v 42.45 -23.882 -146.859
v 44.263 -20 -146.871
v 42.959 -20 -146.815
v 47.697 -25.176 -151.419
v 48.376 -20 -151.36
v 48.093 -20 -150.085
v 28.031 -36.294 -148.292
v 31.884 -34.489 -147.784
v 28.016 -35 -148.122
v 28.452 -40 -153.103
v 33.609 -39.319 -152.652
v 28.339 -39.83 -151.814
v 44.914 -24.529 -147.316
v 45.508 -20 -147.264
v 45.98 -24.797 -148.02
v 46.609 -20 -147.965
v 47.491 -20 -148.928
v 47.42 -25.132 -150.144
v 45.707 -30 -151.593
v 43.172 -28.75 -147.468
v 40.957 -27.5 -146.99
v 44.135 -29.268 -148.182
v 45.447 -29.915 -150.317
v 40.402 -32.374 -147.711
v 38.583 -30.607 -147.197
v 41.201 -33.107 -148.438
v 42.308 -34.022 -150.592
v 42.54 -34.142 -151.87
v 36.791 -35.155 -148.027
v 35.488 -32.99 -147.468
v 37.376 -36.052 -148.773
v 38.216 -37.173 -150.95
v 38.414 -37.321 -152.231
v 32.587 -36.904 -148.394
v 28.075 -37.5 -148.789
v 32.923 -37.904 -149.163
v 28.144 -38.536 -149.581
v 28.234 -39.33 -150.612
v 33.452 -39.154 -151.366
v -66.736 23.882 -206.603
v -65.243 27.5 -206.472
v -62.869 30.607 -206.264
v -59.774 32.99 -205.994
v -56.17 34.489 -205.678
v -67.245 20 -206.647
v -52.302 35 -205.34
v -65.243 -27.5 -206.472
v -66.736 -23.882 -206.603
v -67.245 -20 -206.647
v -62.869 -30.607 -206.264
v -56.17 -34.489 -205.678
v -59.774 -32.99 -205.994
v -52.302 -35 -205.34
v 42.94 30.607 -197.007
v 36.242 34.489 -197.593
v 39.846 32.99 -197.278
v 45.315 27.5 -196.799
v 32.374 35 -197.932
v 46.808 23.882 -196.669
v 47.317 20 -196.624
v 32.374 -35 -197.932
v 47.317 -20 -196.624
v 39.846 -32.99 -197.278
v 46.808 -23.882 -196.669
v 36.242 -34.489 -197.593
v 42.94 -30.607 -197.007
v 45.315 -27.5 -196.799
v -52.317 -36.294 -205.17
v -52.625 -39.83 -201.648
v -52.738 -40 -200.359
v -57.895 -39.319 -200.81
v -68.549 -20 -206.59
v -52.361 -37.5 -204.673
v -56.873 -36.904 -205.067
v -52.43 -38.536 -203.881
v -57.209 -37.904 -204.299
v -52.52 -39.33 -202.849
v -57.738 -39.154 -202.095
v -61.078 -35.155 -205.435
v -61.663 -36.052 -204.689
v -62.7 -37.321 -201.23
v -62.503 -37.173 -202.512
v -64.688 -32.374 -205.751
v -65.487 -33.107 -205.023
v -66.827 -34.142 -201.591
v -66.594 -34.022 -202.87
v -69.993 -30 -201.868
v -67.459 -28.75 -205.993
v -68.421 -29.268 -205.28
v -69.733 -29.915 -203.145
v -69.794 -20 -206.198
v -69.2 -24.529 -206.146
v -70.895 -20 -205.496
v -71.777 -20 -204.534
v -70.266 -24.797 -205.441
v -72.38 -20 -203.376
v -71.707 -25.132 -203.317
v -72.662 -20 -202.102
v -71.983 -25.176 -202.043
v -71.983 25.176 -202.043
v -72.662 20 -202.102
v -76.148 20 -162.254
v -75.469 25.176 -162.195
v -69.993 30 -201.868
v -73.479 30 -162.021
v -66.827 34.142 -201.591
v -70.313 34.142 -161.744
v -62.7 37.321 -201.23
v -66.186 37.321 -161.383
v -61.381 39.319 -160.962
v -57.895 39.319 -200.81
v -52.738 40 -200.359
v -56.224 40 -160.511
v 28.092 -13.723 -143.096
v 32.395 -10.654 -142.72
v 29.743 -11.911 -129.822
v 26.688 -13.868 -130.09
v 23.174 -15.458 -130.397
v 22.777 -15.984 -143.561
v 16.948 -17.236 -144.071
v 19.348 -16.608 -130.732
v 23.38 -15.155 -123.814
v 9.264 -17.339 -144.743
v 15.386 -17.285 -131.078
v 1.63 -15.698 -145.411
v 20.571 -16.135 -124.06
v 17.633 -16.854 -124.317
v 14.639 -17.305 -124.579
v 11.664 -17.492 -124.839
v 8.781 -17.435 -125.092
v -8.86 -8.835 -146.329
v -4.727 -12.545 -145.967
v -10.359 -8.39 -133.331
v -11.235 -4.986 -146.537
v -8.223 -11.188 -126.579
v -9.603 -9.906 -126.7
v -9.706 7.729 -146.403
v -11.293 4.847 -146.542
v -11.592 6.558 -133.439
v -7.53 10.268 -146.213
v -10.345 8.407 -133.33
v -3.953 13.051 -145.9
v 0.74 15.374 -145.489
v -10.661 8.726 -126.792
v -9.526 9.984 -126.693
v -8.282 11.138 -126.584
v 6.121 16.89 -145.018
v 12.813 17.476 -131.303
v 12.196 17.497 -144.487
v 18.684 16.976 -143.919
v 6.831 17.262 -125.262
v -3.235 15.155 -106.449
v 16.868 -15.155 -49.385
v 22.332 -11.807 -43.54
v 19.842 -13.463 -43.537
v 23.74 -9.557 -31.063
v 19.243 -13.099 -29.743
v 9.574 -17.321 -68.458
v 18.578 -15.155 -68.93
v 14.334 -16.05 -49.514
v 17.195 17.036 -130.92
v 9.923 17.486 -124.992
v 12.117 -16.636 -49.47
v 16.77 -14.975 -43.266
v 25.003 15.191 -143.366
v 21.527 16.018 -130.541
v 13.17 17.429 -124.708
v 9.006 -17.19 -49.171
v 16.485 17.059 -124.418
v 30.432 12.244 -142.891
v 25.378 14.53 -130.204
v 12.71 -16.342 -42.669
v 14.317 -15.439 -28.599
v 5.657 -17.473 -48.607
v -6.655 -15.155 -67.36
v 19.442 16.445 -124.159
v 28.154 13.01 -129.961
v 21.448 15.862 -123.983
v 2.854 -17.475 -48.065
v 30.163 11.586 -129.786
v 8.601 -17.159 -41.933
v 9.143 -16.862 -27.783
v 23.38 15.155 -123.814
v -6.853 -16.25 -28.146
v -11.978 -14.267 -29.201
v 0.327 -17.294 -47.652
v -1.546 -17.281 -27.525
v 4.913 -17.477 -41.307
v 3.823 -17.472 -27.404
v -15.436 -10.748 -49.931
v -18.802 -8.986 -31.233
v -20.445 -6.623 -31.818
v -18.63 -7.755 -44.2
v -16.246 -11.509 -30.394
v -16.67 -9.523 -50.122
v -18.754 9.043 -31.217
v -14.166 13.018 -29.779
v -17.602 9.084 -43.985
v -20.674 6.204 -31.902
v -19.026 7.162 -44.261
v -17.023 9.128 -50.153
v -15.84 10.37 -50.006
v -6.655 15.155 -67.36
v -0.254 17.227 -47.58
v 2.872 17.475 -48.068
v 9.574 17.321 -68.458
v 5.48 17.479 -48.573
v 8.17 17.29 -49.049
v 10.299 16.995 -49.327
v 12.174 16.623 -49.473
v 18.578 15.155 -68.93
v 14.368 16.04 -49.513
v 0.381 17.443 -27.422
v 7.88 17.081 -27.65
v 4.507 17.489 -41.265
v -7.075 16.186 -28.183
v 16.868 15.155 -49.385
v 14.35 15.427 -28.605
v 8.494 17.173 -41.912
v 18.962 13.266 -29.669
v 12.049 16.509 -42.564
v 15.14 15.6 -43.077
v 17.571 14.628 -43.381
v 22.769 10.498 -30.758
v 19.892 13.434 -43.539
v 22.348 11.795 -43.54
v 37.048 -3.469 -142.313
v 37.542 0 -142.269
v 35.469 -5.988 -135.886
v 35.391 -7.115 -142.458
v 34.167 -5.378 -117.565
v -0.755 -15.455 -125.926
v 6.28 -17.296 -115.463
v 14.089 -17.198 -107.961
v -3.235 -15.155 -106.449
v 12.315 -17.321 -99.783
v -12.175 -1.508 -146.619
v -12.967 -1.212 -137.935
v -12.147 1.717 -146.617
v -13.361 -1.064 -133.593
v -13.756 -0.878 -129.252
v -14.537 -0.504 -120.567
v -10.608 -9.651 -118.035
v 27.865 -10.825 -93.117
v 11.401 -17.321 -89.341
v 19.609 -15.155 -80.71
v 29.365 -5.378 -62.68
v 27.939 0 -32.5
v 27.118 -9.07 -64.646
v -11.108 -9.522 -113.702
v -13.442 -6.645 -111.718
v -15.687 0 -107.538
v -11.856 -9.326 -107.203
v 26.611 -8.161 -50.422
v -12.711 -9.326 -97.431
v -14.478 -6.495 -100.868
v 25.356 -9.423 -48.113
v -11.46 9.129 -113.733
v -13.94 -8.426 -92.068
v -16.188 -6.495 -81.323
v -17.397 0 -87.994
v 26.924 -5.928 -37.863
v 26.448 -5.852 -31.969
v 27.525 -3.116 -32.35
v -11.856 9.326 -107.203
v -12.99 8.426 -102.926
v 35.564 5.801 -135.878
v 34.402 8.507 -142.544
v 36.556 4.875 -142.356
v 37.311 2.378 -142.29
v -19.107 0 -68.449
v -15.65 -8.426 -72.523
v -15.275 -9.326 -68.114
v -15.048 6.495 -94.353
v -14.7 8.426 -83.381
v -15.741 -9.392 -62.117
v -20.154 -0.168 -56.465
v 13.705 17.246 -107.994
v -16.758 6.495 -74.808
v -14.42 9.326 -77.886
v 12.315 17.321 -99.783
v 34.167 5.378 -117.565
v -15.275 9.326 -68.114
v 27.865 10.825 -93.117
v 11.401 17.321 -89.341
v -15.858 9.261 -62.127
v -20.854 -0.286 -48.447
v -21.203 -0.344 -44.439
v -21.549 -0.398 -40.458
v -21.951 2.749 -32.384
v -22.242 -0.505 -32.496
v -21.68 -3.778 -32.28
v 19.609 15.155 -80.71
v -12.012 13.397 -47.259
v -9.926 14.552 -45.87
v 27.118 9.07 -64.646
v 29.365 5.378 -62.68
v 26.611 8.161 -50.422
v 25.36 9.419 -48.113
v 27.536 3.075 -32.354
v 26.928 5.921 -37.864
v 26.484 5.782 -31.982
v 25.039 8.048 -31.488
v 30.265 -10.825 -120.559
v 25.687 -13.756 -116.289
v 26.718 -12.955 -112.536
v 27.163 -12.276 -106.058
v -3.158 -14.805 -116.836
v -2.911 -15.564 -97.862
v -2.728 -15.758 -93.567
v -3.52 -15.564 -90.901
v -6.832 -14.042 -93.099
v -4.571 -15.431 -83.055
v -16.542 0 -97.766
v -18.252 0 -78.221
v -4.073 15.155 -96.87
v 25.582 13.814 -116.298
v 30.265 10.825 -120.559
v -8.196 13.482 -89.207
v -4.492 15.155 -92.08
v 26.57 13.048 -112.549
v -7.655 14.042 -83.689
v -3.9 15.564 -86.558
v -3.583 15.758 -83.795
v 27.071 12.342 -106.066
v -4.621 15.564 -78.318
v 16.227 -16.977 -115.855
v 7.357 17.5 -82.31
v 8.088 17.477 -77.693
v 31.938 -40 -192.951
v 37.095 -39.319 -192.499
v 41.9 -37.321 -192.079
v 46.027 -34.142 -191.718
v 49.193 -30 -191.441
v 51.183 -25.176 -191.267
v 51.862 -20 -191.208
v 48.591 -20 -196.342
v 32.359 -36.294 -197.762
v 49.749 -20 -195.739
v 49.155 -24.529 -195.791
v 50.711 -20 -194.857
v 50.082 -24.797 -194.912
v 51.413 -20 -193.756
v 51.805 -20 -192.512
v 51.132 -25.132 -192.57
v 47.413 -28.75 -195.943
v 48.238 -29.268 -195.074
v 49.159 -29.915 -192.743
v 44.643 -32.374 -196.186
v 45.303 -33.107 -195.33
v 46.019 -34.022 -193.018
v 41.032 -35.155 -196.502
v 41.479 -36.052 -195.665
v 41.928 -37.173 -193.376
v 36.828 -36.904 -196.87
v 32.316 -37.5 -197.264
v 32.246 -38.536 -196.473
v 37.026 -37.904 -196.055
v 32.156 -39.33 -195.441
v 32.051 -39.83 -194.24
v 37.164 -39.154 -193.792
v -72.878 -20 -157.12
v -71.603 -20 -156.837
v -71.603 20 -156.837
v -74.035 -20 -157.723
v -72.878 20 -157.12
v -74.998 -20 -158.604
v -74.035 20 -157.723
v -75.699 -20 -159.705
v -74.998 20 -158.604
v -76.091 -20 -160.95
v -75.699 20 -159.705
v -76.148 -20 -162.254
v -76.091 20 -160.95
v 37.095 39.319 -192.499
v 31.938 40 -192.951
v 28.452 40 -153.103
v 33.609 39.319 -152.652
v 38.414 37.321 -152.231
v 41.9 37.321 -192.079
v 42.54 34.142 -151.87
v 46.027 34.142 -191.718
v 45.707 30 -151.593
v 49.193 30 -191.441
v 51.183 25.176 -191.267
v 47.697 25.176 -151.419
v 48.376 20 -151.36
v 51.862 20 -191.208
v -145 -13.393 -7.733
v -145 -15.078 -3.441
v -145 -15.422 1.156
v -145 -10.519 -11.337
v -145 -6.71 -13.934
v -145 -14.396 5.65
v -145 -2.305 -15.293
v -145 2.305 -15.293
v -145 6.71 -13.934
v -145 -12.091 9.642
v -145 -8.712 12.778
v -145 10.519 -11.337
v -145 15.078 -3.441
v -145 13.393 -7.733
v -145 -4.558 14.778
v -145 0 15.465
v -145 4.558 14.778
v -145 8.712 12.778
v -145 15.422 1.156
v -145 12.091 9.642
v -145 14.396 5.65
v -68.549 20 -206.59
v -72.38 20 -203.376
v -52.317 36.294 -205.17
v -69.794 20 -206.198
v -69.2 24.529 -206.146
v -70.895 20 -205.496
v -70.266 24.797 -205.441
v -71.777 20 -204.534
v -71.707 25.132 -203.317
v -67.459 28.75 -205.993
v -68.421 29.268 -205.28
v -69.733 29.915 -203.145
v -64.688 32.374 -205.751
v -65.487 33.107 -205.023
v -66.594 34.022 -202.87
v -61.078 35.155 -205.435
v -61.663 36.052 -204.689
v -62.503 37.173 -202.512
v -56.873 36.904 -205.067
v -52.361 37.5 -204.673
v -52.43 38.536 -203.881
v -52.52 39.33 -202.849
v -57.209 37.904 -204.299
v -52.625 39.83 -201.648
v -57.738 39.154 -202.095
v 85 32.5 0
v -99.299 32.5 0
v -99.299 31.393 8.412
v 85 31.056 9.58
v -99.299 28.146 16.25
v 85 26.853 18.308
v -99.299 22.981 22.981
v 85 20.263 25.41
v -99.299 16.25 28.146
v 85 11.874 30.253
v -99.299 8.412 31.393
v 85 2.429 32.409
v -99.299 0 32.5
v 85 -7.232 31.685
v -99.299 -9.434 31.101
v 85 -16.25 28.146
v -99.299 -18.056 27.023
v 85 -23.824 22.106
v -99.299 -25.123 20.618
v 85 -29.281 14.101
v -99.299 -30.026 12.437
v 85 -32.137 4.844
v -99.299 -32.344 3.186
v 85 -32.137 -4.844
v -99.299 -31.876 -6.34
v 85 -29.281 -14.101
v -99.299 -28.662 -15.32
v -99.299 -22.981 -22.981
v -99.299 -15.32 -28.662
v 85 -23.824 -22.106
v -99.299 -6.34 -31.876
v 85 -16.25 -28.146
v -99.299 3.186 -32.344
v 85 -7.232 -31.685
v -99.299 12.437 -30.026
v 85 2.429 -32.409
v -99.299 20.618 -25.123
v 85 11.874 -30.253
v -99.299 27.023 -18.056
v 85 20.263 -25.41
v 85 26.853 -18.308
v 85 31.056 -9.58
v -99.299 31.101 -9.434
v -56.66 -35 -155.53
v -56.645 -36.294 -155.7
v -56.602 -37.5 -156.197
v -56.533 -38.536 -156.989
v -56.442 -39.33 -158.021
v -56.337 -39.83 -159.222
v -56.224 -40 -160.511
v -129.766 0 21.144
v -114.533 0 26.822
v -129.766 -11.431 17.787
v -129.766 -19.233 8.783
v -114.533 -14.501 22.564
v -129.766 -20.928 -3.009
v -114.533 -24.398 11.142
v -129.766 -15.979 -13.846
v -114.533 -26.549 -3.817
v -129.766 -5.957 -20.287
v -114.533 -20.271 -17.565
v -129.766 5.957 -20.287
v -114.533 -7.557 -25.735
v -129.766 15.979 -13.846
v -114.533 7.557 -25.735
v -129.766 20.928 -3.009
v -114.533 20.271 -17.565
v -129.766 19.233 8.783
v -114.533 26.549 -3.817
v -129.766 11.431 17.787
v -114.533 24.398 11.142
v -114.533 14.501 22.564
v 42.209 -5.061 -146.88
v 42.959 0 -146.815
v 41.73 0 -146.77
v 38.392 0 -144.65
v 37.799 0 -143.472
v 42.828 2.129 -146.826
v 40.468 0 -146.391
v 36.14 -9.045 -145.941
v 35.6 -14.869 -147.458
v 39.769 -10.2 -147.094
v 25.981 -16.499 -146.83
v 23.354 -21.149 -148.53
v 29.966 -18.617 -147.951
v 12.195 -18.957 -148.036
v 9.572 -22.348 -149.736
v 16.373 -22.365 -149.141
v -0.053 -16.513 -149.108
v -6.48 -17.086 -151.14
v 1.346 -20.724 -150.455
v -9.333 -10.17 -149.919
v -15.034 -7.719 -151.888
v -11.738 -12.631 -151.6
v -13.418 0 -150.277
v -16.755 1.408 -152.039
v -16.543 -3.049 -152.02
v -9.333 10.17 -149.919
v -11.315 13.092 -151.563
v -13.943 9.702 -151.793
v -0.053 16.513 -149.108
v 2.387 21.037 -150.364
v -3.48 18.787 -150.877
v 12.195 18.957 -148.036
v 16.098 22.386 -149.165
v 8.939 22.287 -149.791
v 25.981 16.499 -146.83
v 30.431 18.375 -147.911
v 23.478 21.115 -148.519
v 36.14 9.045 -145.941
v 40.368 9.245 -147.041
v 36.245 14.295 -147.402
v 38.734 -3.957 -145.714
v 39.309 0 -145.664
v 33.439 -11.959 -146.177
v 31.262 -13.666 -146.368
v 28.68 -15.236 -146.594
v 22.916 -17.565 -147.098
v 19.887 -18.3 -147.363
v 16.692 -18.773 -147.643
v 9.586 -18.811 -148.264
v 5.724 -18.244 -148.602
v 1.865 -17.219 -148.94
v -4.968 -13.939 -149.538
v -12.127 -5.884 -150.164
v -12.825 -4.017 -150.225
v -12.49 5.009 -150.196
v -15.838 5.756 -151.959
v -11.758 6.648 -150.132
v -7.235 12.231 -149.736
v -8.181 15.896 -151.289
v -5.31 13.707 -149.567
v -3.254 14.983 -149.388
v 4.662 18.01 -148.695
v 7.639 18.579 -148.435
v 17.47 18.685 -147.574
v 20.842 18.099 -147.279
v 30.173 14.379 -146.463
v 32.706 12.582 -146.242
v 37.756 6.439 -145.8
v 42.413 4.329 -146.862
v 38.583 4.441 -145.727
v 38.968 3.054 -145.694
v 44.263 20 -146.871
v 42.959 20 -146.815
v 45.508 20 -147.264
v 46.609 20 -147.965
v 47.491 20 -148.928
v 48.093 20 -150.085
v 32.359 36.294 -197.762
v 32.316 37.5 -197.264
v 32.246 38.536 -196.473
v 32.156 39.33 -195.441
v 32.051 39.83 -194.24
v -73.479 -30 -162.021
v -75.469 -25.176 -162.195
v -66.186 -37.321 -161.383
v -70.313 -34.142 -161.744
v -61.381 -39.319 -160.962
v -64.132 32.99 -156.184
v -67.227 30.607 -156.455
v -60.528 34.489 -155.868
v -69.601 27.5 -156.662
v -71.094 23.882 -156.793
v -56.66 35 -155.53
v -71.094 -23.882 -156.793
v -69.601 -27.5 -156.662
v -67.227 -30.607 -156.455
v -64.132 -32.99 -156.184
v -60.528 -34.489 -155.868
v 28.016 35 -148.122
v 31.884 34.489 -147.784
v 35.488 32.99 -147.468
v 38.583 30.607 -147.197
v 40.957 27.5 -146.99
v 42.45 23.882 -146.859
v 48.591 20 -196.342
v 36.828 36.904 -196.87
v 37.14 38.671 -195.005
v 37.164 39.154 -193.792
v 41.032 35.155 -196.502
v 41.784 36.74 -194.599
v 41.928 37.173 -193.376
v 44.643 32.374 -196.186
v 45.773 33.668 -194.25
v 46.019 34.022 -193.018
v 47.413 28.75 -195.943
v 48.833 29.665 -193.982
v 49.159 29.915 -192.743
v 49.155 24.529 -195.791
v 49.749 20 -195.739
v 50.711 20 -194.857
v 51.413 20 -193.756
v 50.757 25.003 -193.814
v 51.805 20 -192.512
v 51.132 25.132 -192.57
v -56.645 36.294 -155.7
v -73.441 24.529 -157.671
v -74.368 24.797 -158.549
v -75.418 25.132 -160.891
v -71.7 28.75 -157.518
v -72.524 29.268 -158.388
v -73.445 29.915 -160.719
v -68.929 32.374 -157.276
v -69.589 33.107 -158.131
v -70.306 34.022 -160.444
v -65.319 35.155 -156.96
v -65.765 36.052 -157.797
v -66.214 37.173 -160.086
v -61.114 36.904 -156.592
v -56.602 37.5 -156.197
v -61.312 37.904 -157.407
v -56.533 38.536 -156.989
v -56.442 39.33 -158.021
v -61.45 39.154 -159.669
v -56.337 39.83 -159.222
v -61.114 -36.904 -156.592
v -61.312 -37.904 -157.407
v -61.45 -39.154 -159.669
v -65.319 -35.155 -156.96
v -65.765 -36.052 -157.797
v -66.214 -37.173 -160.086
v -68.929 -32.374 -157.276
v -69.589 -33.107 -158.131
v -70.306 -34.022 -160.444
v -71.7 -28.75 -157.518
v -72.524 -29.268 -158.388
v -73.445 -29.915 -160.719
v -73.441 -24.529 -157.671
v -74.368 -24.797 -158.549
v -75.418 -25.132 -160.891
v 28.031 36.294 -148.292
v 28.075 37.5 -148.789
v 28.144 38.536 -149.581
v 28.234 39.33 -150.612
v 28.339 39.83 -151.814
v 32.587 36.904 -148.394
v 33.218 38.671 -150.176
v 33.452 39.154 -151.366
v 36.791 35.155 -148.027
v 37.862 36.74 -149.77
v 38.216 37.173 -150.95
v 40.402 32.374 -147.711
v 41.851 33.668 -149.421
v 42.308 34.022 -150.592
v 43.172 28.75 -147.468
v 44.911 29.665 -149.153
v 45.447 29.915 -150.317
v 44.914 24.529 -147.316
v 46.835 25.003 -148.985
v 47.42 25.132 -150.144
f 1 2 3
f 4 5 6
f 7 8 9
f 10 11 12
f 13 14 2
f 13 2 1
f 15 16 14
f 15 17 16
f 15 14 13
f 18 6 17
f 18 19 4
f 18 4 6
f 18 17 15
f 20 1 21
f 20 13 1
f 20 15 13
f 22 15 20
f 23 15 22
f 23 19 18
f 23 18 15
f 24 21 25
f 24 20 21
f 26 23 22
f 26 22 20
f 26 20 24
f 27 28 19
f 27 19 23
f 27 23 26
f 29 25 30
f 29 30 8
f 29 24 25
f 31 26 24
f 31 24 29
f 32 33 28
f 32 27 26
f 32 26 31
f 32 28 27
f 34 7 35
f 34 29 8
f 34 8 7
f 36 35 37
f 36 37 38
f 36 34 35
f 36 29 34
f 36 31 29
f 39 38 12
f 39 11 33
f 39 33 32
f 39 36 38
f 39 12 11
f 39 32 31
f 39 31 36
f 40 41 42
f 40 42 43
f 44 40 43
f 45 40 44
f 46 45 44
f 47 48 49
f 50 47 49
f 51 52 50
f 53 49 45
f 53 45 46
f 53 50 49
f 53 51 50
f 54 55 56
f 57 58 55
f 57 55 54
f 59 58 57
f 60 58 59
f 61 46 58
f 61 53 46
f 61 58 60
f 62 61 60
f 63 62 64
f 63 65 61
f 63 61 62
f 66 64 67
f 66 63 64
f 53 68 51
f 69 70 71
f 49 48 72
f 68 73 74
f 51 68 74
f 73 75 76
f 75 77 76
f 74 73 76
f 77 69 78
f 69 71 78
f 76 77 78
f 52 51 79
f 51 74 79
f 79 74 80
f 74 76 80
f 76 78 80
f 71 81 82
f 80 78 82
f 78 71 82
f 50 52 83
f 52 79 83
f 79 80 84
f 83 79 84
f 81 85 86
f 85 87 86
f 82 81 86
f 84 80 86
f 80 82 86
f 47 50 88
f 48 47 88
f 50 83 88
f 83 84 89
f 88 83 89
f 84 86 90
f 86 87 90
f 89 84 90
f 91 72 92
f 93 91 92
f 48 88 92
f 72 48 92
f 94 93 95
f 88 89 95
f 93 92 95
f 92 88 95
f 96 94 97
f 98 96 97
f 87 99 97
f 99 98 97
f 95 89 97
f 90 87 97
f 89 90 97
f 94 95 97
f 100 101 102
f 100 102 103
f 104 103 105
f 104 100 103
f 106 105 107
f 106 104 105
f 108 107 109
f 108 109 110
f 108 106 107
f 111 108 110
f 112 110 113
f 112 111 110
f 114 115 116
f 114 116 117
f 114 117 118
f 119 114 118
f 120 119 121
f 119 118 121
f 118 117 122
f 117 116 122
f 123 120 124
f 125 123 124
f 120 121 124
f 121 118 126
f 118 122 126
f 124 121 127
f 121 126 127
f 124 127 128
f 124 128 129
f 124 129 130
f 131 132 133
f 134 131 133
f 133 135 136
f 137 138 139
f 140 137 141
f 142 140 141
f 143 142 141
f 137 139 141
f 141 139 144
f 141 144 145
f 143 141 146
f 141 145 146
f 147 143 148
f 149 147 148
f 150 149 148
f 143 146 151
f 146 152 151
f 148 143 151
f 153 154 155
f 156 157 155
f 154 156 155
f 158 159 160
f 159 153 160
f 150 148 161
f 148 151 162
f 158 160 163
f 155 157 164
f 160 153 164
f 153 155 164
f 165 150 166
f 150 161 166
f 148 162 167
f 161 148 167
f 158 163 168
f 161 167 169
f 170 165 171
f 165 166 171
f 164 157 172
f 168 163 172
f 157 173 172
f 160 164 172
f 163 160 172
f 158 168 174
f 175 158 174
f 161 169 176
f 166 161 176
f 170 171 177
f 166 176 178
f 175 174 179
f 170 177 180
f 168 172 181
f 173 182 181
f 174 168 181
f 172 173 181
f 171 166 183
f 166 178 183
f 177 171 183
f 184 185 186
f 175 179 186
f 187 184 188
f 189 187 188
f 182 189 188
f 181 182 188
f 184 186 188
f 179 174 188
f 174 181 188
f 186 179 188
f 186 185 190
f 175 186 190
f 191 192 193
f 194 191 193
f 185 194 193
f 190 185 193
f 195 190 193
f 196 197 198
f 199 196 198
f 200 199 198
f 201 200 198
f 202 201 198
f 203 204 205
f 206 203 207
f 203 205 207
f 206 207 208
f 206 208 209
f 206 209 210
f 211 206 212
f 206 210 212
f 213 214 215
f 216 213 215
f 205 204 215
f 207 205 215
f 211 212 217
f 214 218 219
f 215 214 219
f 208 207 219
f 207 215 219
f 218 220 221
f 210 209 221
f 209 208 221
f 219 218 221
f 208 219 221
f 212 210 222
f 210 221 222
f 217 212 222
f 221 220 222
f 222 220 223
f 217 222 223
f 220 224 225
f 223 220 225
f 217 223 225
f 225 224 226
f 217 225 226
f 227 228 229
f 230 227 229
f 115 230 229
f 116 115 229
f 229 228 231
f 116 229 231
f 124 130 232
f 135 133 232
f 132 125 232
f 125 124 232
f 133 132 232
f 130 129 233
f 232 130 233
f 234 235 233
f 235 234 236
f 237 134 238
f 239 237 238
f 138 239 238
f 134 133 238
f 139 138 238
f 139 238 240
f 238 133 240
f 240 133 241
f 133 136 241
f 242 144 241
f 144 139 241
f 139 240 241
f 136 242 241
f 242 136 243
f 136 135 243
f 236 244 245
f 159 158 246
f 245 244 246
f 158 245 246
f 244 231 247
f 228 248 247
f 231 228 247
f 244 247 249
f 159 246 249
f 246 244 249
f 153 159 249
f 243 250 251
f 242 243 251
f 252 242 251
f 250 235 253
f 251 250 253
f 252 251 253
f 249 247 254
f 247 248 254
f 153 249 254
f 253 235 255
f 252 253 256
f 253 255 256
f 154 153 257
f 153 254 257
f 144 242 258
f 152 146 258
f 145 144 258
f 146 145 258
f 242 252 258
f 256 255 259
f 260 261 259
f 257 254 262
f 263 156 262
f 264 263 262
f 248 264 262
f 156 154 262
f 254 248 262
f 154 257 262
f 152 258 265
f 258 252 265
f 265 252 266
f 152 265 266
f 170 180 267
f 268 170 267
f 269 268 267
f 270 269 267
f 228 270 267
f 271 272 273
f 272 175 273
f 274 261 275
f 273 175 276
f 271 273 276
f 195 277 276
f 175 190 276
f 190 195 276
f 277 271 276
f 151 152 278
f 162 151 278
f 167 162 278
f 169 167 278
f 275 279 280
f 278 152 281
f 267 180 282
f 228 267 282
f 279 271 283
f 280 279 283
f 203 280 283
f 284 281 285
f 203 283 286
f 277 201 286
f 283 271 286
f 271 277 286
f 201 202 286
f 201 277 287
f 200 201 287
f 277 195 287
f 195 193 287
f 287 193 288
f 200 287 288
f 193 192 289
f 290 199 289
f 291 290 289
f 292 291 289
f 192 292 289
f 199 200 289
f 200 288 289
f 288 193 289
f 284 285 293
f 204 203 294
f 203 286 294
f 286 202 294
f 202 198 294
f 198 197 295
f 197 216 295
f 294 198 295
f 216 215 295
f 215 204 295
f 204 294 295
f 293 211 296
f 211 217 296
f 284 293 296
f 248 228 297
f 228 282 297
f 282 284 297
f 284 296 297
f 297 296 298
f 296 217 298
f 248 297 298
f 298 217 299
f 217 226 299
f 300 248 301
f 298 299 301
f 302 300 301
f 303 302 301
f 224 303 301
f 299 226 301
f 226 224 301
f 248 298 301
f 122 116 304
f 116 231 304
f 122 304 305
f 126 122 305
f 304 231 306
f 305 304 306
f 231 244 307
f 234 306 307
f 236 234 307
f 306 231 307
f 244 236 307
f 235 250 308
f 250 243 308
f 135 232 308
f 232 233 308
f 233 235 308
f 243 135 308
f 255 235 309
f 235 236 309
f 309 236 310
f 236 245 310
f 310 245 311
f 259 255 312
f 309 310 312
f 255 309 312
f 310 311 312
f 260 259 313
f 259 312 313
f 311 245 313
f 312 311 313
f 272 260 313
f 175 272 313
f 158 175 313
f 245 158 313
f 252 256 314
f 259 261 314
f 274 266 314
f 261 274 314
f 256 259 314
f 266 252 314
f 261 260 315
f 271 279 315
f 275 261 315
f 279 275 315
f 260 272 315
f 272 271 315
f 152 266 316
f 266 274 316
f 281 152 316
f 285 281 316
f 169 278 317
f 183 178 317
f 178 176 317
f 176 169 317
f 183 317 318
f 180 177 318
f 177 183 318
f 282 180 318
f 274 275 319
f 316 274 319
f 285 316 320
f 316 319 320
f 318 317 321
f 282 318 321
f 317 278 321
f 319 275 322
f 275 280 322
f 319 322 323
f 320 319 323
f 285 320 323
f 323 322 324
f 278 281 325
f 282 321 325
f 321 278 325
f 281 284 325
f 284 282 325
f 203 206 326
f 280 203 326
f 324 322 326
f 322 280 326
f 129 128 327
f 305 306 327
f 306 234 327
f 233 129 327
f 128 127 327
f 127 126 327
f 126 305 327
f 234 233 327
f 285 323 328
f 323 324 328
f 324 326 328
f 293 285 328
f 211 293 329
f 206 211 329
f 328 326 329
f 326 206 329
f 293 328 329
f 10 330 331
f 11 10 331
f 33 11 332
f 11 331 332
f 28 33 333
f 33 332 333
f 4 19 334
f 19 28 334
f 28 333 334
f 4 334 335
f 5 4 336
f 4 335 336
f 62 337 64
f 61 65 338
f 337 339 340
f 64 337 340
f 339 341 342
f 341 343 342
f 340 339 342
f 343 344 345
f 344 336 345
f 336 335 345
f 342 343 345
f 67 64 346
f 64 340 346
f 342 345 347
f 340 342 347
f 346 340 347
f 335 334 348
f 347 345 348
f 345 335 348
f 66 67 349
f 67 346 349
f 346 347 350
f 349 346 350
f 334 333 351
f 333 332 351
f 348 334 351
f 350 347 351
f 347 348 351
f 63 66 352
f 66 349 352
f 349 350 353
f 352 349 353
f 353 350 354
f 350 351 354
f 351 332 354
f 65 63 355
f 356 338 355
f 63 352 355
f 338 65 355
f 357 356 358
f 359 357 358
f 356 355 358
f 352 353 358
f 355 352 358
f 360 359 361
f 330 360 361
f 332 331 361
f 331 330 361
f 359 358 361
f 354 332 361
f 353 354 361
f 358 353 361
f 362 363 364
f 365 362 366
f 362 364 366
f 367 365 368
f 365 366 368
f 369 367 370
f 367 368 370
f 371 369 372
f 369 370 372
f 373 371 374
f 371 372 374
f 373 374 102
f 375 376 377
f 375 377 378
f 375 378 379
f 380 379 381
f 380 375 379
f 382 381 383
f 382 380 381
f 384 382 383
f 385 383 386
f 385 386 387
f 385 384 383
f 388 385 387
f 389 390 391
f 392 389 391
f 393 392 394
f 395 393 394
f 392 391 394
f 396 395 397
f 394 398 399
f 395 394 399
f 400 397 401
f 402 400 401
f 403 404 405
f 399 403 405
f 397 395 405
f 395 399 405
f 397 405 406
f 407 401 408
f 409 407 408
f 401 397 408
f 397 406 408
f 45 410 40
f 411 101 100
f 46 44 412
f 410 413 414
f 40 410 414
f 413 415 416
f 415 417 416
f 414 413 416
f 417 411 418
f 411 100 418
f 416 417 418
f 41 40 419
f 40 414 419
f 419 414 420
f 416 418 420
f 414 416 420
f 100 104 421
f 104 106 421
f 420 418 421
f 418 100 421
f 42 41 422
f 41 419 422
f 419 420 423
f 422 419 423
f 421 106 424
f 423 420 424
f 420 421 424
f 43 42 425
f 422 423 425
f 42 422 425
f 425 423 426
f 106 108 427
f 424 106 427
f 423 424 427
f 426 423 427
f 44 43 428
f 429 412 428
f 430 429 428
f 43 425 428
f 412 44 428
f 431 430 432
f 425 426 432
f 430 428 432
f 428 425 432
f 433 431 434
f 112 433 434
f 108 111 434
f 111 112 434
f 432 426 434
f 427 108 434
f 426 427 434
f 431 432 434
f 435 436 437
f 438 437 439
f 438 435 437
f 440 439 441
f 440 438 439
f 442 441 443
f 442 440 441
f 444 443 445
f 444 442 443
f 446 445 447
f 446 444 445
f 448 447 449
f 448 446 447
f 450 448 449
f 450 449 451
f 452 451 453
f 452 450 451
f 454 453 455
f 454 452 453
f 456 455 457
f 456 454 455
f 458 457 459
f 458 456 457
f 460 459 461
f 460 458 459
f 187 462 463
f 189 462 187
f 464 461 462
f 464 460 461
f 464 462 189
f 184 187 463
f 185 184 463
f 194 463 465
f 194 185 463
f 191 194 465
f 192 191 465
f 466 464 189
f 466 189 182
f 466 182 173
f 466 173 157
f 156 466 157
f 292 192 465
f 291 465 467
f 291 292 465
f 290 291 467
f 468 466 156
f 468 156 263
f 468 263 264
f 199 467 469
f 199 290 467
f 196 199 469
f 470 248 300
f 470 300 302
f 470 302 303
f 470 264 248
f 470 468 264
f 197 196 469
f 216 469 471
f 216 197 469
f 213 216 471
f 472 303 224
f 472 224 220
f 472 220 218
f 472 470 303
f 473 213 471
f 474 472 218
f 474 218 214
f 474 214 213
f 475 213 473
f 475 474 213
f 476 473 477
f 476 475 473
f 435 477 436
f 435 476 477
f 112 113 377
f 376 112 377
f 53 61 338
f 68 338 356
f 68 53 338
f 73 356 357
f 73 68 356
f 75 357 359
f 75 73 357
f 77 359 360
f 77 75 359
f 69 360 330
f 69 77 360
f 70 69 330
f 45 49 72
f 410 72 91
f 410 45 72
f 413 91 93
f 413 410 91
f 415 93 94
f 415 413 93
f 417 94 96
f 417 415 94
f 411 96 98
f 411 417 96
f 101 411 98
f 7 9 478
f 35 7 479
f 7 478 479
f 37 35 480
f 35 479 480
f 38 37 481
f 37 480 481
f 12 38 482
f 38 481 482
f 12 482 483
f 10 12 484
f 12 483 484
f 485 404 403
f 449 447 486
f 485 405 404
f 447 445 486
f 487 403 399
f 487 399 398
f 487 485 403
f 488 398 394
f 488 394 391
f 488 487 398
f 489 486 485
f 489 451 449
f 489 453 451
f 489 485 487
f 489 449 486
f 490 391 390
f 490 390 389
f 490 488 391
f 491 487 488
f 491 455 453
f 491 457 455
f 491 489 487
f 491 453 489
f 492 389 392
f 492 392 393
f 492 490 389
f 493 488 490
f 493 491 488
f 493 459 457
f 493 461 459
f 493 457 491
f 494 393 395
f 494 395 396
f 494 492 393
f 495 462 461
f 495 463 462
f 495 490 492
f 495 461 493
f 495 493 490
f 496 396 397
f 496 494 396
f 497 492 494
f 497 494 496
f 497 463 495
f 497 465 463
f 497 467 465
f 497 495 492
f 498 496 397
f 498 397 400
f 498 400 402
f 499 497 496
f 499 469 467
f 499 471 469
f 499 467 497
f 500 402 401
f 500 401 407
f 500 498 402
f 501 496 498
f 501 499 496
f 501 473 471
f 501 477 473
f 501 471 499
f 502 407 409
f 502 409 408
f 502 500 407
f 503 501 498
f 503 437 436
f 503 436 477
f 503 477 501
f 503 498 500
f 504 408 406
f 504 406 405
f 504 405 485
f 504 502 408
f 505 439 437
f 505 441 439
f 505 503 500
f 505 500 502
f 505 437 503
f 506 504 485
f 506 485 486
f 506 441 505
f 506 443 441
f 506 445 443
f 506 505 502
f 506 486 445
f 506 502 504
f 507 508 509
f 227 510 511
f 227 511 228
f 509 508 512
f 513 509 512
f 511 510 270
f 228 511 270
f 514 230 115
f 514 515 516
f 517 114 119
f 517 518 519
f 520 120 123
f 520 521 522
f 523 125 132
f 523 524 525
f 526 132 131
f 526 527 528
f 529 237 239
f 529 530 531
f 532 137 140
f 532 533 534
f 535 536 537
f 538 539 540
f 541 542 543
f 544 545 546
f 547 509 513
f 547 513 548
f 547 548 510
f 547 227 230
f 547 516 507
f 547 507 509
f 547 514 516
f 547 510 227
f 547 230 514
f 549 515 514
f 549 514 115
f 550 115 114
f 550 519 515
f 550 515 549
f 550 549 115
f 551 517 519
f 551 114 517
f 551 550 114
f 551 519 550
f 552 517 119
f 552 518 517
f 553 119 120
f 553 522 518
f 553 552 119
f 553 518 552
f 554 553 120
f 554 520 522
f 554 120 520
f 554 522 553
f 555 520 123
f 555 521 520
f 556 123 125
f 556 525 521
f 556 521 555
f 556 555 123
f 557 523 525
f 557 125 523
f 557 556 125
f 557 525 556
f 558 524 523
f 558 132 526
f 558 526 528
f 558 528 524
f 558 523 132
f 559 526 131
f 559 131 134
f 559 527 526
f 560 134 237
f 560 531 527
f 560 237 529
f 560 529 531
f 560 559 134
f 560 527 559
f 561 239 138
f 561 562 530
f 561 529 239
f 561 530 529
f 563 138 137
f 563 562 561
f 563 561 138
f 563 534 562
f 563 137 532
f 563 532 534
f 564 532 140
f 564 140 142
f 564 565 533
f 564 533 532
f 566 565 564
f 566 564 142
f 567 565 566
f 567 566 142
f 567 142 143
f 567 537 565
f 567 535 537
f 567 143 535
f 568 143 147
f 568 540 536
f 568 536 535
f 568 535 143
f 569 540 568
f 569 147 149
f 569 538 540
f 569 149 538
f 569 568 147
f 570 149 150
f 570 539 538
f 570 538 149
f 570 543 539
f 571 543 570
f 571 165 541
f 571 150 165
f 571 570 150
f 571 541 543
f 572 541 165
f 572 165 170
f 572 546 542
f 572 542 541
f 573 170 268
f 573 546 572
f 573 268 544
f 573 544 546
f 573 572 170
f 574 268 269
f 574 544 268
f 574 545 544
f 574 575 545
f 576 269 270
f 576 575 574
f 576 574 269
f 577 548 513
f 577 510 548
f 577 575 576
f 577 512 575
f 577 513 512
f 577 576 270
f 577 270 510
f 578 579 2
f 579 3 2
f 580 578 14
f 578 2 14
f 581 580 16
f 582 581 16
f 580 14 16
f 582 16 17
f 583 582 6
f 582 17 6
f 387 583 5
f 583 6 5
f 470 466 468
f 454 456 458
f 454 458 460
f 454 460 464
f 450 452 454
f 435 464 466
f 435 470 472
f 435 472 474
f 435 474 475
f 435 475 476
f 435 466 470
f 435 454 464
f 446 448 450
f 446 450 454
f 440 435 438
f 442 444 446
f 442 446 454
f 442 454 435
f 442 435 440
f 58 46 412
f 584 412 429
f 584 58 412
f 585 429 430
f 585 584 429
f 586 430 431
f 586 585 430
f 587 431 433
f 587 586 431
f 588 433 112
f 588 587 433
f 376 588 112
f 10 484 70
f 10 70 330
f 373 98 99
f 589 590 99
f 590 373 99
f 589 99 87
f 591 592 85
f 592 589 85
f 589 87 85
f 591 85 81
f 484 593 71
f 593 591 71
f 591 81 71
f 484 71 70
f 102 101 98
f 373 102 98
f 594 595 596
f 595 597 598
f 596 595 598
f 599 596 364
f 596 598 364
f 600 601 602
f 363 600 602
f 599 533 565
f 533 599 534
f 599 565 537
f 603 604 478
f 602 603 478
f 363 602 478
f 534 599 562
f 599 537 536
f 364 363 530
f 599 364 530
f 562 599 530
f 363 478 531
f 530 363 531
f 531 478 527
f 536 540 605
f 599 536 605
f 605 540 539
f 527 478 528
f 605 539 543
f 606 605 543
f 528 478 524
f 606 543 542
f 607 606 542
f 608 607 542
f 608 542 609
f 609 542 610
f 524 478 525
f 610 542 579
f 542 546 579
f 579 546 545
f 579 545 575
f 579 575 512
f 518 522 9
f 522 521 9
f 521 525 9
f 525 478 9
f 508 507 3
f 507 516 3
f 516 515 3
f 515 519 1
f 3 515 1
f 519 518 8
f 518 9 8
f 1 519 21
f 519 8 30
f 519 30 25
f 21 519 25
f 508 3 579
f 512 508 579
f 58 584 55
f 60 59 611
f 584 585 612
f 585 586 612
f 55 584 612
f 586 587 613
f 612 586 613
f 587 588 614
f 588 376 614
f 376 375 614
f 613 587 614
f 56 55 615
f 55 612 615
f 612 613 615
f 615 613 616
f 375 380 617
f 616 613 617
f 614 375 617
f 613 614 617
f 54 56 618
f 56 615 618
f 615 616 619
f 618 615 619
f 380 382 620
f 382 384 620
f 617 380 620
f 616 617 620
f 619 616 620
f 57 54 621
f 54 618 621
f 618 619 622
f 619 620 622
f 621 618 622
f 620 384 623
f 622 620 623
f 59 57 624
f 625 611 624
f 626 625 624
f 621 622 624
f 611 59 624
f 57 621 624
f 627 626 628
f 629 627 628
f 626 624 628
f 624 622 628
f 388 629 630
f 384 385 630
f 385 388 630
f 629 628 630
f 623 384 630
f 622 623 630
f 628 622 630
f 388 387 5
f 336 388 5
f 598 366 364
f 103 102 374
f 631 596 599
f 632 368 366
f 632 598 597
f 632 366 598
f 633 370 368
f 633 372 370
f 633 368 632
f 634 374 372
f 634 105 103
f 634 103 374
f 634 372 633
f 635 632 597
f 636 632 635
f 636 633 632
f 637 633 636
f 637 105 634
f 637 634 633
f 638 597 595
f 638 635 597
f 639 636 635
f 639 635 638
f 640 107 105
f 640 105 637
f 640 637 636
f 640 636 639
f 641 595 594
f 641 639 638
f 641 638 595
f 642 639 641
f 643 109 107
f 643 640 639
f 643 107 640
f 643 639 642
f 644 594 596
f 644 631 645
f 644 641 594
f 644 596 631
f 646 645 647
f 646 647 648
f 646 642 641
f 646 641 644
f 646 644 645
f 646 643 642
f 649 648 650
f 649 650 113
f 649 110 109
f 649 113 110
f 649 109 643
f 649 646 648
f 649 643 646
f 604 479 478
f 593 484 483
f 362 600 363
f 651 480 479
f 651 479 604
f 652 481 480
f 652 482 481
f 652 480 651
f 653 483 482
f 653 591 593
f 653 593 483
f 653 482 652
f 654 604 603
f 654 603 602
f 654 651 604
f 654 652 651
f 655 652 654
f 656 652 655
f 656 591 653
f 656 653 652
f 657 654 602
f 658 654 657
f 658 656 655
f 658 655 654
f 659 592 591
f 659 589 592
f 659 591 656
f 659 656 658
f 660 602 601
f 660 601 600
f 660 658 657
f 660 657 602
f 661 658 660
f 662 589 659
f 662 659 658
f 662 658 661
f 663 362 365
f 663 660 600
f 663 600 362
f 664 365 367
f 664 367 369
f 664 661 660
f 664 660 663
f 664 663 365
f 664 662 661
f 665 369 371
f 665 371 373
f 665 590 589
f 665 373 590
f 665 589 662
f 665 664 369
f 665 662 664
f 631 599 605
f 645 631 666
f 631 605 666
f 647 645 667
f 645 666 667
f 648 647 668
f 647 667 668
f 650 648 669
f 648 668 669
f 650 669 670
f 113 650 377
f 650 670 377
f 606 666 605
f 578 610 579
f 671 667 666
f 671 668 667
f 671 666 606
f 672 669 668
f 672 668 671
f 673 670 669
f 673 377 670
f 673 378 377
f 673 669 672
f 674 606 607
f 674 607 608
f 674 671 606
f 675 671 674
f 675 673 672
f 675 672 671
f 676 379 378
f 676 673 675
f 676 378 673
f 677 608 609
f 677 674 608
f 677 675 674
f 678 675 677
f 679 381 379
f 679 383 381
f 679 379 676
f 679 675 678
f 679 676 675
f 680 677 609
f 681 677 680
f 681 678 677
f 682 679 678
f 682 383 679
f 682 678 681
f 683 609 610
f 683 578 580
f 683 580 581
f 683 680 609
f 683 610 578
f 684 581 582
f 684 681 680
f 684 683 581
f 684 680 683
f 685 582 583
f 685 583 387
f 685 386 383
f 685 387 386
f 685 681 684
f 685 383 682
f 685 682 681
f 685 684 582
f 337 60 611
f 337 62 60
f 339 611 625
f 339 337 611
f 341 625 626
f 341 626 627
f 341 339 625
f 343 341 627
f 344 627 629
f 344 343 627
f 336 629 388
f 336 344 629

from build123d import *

# Parameters (mm, degrees)
F0_R          = 32.5
F1_DEPTH      = 85
F1_DEPTH_BACK = 145
F5_DEPTH      = 150
F7_W          = 125
F7_H          = 80
F8_DEPTH      = 50
F11_R         = 20
F12_R         = 4.99999


# Not quite as in the source:
# - a fillet or chamfer is up to 0.001 mm smaller than in the source, because OpenCascade refuses the exact size


with BuildPart() as f1:
    # F0 (on Right) → F1 (new body, two sides)
    with BuildSketch(Plane.YZ) as f1_sk:
        Circle(F0_R)
    extrude(amount=F1_DEPTH)
    extrude(f1_sk.sketch, amount=-F1_DEPTH_BACK)

    # F4 (on line) → F5 (join)
    with BuildSketch(Plane(origin=(0, 0, 0), x_dir=(0.9961946981, 0, 0.0871557427), z_dir=(0.0871557427, 0, -0.9961946981))):
        with BuildLine():
            add(Edge.make_bspline(
                [(25, 0), (25, 30.3108891325), (-12.5, 15.1554445662), (-50, 0), (-12.5, -15.1554445662), (25, -30.3108891325), (25, 0)],
                knots=[0, 0, 0, 2.0943951024, 2.0943951024, 4.1887902048, 4.1887902048, 6.2831853072, 6.2831853072, 6.2831853072], degree=2, weights=[1, 0.5, 1, 0.5, 1, 0.5, 1]))
        make_face()
    extrude(amount=F5_DEPTH)

    # F7 (on offset) → F8 (join)
    with BuildSketch(Plane(origin=(13.0733614121, 0, -149.4292047138), x_dir=(0.9961946981, 0, 0.0871557427), z_dir=(0.0871557427, 0, -0.9961946981))):
        with Locations((-27.5, 0)):
            Rectangle(F7_W, F7_H)
    extrude(amount=F8_DEPTH)

    # F9 (on Front) → F10 (revolve, cut)
    with BuildSketch(Plane.XZ):
        Polygon((-145, 32.5), (-145, 15.4653014615), (-99.2988270521, 32.5), align=None)
    revolve(axis=Axis((-67.4336478114, 0, 0), (1, 0, 0)), mode=Mode.SUBTRACT)

    # F11
    f11_edges = [f1.edges().sort_by_distance(p)[0] for p in [
        (-74.405268, 40, -182.178089),
        (-74.405268, -40, -182.178089),
        (50.119069, -40, -171.283621),
        (50.119069, 40, -171.283621),
    ]]
    fillet(f11_edges, radius=F11_R)

    # F12 (radius 5 in the source; OpenCascade refuses exactly that, so slightly less here)
    f12_edges = [f1.edges().sort_by_distance(p)[0] for p in [
        (-11.831506, 0, -151.608098),
        (47.940176, 0, -146.378754),
        (42.104602, 34.142136, -146.8893),
        (42.104602, -34.142136, -146.8893),
        (-14.321993, 40, -151.825988),
        (-14.321993, -40, -151.825988),
        (-70.748588, 34.142136, -156.762675),
        (-70.748588, -34.142136, -156.762675),
        (-76.584161, 0, -157.273222),
        (52.297963, 0, -196.188489),
        (46.46239, 34.142136, -196.699035),
        (46.46239, -34.142136, -196.699035),
        (-9.964206, 40, -201.635723),
        (-9.964206, -40, -201.635723),
        (-66.390801, 34.142136, -206.57241),
        (-66.390801, -34.142136, -206.57241),
        (-72.226374, 0, -207.082956),
    ]]
    fillet(f12_edges, radius=F12_R)


solid = f1.part
